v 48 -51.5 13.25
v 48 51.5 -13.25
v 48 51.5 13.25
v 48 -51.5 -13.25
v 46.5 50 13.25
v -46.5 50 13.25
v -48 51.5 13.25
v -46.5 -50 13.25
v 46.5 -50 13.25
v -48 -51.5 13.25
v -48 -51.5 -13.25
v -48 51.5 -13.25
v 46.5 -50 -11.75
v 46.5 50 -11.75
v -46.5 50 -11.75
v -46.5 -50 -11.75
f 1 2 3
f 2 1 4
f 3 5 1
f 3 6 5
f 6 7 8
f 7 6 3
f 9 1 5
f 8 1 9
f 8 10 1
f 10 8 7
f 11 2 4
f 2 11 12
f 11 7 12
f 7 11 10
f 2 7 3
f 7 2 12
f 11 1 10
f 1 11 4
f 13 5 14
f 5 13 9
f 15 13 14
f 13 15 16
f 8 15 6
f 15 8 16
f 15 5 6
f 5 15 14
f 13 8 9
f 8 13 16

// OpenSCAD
L = 103;
W = 96;
H = 26.5;
T = 1.5;
difference() {
    cube([W,L,H],true);
    translate([0,0,(T)]) cube([(W-2*T),(L-2*T),(H)],true);
}
